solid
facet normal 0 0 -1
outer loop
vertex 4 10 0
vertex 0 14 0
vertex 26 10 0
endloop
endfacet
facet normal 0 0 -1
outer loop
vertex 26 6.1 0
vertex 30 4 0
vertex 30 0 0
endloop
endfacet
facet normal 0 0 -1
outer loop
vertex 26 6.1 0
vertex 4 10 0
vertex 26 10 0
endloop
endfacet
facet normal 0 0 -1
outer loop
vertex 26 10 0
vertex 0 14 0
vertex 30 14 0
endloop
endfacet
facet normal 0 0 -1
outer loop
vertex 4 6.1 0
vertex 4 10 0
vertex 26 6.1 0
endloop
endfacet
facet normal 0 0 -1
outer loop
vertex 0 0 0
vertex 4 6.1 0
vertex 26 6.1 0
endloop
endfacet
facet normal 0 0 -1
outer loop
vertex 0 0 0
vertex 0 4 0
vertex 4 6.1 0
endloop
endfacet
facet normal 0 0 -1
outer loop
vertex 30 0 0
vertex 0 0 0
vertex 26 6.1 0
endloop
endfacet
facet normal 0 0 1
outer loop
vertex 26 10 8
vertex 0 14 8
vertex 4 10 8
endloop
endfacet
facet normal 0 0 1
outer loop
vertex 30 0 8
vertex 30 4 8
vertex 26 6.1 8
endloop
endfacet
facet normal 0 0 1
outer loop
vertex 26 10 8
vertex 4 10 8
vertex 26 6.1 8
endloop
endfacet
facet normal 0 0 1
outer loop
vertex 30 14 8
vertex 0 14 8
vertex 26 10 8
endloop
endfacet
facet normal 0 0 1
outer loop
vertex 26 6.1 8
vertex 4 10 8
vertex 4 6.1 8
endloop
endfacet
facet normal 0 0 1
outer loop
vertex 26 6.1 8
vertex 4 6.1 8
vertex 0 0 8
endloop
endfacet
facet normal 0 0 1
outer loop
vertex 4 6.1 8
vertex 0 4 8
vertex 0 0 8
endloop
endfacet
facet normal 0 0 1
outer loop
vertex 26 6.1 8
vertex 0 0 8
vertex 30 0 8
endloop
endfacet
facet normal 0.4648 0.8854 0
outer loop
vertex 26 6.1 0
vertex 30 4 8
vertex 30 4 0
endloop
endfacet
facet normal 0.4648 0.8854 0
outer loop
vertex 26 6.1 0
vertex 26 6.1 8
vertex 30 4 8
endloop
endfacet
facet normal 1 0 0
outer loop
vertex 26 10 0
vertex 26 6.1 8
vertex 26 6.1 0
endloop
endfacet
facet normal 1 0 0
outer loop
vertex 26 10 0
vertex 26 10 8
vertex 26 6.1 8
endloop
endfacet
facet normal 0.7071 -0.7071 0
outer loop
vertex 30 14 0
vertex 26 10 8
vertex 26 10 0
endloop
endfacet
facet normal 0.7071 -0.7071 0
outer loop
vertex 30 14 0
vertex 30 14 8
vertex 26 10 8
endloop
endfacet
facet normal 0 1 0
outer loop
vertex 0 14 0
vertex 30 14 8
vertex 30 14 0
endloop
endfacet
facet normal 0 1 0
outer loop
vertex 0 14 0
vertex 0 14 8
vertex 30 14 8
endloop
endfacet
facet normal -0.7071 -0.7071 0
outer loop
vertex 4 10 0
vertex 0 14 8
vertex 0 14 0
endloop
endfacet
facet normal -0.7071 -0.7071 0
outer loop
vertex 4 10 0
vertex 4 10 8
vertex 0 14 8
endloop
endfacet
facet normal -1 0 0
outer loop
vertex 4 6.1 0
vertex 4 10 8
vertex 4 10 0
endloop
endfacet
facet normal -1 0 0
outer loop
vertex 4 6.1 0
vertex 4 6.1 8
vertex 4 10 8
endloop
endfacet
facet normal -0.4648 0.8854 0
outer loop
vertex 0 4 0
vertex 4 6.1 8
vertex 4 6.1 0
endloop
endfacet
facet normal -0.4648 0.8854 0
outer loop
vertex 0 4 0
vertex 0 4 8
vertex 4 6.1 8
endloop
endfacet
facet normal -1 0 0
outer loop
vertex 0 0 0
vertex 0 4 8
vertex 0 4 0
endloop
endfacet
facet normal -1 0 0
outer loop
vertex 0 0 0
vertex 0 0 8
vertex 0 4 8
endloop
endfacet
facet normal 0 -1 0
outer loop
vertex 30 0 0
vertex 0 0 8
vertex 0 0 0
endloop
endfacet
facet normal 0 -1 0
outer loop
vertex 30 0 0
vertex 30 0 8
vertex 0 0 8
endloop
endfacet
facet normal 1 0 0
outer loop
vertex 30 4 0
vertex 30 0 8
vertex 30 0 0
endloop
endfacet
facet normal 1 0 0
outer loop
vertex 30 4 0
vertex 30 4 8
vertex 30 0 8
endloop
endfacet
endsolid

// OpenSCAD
$fn = 32;

// ----------------------------------------------------------------------
// Key bar: dovetail key, 8 mm thick
// ----------------------------------------------------------------------

// --- parameters (mm) ---
profile_height = 8;       // extrusion height
profile_points = 10;      // points of the closed outline

profile = [[0, 0], [30, 0], [30, 4], [26, 6.1], [26, 10], [30, 14], [0, 14], [4, 10], [4, 6.1], [0, 4]];  // single closed polygon, 10 points, counter clockwise

// --- the one profile operation ---
linear_extrude(height = profile_height) polygon(points = profile);
